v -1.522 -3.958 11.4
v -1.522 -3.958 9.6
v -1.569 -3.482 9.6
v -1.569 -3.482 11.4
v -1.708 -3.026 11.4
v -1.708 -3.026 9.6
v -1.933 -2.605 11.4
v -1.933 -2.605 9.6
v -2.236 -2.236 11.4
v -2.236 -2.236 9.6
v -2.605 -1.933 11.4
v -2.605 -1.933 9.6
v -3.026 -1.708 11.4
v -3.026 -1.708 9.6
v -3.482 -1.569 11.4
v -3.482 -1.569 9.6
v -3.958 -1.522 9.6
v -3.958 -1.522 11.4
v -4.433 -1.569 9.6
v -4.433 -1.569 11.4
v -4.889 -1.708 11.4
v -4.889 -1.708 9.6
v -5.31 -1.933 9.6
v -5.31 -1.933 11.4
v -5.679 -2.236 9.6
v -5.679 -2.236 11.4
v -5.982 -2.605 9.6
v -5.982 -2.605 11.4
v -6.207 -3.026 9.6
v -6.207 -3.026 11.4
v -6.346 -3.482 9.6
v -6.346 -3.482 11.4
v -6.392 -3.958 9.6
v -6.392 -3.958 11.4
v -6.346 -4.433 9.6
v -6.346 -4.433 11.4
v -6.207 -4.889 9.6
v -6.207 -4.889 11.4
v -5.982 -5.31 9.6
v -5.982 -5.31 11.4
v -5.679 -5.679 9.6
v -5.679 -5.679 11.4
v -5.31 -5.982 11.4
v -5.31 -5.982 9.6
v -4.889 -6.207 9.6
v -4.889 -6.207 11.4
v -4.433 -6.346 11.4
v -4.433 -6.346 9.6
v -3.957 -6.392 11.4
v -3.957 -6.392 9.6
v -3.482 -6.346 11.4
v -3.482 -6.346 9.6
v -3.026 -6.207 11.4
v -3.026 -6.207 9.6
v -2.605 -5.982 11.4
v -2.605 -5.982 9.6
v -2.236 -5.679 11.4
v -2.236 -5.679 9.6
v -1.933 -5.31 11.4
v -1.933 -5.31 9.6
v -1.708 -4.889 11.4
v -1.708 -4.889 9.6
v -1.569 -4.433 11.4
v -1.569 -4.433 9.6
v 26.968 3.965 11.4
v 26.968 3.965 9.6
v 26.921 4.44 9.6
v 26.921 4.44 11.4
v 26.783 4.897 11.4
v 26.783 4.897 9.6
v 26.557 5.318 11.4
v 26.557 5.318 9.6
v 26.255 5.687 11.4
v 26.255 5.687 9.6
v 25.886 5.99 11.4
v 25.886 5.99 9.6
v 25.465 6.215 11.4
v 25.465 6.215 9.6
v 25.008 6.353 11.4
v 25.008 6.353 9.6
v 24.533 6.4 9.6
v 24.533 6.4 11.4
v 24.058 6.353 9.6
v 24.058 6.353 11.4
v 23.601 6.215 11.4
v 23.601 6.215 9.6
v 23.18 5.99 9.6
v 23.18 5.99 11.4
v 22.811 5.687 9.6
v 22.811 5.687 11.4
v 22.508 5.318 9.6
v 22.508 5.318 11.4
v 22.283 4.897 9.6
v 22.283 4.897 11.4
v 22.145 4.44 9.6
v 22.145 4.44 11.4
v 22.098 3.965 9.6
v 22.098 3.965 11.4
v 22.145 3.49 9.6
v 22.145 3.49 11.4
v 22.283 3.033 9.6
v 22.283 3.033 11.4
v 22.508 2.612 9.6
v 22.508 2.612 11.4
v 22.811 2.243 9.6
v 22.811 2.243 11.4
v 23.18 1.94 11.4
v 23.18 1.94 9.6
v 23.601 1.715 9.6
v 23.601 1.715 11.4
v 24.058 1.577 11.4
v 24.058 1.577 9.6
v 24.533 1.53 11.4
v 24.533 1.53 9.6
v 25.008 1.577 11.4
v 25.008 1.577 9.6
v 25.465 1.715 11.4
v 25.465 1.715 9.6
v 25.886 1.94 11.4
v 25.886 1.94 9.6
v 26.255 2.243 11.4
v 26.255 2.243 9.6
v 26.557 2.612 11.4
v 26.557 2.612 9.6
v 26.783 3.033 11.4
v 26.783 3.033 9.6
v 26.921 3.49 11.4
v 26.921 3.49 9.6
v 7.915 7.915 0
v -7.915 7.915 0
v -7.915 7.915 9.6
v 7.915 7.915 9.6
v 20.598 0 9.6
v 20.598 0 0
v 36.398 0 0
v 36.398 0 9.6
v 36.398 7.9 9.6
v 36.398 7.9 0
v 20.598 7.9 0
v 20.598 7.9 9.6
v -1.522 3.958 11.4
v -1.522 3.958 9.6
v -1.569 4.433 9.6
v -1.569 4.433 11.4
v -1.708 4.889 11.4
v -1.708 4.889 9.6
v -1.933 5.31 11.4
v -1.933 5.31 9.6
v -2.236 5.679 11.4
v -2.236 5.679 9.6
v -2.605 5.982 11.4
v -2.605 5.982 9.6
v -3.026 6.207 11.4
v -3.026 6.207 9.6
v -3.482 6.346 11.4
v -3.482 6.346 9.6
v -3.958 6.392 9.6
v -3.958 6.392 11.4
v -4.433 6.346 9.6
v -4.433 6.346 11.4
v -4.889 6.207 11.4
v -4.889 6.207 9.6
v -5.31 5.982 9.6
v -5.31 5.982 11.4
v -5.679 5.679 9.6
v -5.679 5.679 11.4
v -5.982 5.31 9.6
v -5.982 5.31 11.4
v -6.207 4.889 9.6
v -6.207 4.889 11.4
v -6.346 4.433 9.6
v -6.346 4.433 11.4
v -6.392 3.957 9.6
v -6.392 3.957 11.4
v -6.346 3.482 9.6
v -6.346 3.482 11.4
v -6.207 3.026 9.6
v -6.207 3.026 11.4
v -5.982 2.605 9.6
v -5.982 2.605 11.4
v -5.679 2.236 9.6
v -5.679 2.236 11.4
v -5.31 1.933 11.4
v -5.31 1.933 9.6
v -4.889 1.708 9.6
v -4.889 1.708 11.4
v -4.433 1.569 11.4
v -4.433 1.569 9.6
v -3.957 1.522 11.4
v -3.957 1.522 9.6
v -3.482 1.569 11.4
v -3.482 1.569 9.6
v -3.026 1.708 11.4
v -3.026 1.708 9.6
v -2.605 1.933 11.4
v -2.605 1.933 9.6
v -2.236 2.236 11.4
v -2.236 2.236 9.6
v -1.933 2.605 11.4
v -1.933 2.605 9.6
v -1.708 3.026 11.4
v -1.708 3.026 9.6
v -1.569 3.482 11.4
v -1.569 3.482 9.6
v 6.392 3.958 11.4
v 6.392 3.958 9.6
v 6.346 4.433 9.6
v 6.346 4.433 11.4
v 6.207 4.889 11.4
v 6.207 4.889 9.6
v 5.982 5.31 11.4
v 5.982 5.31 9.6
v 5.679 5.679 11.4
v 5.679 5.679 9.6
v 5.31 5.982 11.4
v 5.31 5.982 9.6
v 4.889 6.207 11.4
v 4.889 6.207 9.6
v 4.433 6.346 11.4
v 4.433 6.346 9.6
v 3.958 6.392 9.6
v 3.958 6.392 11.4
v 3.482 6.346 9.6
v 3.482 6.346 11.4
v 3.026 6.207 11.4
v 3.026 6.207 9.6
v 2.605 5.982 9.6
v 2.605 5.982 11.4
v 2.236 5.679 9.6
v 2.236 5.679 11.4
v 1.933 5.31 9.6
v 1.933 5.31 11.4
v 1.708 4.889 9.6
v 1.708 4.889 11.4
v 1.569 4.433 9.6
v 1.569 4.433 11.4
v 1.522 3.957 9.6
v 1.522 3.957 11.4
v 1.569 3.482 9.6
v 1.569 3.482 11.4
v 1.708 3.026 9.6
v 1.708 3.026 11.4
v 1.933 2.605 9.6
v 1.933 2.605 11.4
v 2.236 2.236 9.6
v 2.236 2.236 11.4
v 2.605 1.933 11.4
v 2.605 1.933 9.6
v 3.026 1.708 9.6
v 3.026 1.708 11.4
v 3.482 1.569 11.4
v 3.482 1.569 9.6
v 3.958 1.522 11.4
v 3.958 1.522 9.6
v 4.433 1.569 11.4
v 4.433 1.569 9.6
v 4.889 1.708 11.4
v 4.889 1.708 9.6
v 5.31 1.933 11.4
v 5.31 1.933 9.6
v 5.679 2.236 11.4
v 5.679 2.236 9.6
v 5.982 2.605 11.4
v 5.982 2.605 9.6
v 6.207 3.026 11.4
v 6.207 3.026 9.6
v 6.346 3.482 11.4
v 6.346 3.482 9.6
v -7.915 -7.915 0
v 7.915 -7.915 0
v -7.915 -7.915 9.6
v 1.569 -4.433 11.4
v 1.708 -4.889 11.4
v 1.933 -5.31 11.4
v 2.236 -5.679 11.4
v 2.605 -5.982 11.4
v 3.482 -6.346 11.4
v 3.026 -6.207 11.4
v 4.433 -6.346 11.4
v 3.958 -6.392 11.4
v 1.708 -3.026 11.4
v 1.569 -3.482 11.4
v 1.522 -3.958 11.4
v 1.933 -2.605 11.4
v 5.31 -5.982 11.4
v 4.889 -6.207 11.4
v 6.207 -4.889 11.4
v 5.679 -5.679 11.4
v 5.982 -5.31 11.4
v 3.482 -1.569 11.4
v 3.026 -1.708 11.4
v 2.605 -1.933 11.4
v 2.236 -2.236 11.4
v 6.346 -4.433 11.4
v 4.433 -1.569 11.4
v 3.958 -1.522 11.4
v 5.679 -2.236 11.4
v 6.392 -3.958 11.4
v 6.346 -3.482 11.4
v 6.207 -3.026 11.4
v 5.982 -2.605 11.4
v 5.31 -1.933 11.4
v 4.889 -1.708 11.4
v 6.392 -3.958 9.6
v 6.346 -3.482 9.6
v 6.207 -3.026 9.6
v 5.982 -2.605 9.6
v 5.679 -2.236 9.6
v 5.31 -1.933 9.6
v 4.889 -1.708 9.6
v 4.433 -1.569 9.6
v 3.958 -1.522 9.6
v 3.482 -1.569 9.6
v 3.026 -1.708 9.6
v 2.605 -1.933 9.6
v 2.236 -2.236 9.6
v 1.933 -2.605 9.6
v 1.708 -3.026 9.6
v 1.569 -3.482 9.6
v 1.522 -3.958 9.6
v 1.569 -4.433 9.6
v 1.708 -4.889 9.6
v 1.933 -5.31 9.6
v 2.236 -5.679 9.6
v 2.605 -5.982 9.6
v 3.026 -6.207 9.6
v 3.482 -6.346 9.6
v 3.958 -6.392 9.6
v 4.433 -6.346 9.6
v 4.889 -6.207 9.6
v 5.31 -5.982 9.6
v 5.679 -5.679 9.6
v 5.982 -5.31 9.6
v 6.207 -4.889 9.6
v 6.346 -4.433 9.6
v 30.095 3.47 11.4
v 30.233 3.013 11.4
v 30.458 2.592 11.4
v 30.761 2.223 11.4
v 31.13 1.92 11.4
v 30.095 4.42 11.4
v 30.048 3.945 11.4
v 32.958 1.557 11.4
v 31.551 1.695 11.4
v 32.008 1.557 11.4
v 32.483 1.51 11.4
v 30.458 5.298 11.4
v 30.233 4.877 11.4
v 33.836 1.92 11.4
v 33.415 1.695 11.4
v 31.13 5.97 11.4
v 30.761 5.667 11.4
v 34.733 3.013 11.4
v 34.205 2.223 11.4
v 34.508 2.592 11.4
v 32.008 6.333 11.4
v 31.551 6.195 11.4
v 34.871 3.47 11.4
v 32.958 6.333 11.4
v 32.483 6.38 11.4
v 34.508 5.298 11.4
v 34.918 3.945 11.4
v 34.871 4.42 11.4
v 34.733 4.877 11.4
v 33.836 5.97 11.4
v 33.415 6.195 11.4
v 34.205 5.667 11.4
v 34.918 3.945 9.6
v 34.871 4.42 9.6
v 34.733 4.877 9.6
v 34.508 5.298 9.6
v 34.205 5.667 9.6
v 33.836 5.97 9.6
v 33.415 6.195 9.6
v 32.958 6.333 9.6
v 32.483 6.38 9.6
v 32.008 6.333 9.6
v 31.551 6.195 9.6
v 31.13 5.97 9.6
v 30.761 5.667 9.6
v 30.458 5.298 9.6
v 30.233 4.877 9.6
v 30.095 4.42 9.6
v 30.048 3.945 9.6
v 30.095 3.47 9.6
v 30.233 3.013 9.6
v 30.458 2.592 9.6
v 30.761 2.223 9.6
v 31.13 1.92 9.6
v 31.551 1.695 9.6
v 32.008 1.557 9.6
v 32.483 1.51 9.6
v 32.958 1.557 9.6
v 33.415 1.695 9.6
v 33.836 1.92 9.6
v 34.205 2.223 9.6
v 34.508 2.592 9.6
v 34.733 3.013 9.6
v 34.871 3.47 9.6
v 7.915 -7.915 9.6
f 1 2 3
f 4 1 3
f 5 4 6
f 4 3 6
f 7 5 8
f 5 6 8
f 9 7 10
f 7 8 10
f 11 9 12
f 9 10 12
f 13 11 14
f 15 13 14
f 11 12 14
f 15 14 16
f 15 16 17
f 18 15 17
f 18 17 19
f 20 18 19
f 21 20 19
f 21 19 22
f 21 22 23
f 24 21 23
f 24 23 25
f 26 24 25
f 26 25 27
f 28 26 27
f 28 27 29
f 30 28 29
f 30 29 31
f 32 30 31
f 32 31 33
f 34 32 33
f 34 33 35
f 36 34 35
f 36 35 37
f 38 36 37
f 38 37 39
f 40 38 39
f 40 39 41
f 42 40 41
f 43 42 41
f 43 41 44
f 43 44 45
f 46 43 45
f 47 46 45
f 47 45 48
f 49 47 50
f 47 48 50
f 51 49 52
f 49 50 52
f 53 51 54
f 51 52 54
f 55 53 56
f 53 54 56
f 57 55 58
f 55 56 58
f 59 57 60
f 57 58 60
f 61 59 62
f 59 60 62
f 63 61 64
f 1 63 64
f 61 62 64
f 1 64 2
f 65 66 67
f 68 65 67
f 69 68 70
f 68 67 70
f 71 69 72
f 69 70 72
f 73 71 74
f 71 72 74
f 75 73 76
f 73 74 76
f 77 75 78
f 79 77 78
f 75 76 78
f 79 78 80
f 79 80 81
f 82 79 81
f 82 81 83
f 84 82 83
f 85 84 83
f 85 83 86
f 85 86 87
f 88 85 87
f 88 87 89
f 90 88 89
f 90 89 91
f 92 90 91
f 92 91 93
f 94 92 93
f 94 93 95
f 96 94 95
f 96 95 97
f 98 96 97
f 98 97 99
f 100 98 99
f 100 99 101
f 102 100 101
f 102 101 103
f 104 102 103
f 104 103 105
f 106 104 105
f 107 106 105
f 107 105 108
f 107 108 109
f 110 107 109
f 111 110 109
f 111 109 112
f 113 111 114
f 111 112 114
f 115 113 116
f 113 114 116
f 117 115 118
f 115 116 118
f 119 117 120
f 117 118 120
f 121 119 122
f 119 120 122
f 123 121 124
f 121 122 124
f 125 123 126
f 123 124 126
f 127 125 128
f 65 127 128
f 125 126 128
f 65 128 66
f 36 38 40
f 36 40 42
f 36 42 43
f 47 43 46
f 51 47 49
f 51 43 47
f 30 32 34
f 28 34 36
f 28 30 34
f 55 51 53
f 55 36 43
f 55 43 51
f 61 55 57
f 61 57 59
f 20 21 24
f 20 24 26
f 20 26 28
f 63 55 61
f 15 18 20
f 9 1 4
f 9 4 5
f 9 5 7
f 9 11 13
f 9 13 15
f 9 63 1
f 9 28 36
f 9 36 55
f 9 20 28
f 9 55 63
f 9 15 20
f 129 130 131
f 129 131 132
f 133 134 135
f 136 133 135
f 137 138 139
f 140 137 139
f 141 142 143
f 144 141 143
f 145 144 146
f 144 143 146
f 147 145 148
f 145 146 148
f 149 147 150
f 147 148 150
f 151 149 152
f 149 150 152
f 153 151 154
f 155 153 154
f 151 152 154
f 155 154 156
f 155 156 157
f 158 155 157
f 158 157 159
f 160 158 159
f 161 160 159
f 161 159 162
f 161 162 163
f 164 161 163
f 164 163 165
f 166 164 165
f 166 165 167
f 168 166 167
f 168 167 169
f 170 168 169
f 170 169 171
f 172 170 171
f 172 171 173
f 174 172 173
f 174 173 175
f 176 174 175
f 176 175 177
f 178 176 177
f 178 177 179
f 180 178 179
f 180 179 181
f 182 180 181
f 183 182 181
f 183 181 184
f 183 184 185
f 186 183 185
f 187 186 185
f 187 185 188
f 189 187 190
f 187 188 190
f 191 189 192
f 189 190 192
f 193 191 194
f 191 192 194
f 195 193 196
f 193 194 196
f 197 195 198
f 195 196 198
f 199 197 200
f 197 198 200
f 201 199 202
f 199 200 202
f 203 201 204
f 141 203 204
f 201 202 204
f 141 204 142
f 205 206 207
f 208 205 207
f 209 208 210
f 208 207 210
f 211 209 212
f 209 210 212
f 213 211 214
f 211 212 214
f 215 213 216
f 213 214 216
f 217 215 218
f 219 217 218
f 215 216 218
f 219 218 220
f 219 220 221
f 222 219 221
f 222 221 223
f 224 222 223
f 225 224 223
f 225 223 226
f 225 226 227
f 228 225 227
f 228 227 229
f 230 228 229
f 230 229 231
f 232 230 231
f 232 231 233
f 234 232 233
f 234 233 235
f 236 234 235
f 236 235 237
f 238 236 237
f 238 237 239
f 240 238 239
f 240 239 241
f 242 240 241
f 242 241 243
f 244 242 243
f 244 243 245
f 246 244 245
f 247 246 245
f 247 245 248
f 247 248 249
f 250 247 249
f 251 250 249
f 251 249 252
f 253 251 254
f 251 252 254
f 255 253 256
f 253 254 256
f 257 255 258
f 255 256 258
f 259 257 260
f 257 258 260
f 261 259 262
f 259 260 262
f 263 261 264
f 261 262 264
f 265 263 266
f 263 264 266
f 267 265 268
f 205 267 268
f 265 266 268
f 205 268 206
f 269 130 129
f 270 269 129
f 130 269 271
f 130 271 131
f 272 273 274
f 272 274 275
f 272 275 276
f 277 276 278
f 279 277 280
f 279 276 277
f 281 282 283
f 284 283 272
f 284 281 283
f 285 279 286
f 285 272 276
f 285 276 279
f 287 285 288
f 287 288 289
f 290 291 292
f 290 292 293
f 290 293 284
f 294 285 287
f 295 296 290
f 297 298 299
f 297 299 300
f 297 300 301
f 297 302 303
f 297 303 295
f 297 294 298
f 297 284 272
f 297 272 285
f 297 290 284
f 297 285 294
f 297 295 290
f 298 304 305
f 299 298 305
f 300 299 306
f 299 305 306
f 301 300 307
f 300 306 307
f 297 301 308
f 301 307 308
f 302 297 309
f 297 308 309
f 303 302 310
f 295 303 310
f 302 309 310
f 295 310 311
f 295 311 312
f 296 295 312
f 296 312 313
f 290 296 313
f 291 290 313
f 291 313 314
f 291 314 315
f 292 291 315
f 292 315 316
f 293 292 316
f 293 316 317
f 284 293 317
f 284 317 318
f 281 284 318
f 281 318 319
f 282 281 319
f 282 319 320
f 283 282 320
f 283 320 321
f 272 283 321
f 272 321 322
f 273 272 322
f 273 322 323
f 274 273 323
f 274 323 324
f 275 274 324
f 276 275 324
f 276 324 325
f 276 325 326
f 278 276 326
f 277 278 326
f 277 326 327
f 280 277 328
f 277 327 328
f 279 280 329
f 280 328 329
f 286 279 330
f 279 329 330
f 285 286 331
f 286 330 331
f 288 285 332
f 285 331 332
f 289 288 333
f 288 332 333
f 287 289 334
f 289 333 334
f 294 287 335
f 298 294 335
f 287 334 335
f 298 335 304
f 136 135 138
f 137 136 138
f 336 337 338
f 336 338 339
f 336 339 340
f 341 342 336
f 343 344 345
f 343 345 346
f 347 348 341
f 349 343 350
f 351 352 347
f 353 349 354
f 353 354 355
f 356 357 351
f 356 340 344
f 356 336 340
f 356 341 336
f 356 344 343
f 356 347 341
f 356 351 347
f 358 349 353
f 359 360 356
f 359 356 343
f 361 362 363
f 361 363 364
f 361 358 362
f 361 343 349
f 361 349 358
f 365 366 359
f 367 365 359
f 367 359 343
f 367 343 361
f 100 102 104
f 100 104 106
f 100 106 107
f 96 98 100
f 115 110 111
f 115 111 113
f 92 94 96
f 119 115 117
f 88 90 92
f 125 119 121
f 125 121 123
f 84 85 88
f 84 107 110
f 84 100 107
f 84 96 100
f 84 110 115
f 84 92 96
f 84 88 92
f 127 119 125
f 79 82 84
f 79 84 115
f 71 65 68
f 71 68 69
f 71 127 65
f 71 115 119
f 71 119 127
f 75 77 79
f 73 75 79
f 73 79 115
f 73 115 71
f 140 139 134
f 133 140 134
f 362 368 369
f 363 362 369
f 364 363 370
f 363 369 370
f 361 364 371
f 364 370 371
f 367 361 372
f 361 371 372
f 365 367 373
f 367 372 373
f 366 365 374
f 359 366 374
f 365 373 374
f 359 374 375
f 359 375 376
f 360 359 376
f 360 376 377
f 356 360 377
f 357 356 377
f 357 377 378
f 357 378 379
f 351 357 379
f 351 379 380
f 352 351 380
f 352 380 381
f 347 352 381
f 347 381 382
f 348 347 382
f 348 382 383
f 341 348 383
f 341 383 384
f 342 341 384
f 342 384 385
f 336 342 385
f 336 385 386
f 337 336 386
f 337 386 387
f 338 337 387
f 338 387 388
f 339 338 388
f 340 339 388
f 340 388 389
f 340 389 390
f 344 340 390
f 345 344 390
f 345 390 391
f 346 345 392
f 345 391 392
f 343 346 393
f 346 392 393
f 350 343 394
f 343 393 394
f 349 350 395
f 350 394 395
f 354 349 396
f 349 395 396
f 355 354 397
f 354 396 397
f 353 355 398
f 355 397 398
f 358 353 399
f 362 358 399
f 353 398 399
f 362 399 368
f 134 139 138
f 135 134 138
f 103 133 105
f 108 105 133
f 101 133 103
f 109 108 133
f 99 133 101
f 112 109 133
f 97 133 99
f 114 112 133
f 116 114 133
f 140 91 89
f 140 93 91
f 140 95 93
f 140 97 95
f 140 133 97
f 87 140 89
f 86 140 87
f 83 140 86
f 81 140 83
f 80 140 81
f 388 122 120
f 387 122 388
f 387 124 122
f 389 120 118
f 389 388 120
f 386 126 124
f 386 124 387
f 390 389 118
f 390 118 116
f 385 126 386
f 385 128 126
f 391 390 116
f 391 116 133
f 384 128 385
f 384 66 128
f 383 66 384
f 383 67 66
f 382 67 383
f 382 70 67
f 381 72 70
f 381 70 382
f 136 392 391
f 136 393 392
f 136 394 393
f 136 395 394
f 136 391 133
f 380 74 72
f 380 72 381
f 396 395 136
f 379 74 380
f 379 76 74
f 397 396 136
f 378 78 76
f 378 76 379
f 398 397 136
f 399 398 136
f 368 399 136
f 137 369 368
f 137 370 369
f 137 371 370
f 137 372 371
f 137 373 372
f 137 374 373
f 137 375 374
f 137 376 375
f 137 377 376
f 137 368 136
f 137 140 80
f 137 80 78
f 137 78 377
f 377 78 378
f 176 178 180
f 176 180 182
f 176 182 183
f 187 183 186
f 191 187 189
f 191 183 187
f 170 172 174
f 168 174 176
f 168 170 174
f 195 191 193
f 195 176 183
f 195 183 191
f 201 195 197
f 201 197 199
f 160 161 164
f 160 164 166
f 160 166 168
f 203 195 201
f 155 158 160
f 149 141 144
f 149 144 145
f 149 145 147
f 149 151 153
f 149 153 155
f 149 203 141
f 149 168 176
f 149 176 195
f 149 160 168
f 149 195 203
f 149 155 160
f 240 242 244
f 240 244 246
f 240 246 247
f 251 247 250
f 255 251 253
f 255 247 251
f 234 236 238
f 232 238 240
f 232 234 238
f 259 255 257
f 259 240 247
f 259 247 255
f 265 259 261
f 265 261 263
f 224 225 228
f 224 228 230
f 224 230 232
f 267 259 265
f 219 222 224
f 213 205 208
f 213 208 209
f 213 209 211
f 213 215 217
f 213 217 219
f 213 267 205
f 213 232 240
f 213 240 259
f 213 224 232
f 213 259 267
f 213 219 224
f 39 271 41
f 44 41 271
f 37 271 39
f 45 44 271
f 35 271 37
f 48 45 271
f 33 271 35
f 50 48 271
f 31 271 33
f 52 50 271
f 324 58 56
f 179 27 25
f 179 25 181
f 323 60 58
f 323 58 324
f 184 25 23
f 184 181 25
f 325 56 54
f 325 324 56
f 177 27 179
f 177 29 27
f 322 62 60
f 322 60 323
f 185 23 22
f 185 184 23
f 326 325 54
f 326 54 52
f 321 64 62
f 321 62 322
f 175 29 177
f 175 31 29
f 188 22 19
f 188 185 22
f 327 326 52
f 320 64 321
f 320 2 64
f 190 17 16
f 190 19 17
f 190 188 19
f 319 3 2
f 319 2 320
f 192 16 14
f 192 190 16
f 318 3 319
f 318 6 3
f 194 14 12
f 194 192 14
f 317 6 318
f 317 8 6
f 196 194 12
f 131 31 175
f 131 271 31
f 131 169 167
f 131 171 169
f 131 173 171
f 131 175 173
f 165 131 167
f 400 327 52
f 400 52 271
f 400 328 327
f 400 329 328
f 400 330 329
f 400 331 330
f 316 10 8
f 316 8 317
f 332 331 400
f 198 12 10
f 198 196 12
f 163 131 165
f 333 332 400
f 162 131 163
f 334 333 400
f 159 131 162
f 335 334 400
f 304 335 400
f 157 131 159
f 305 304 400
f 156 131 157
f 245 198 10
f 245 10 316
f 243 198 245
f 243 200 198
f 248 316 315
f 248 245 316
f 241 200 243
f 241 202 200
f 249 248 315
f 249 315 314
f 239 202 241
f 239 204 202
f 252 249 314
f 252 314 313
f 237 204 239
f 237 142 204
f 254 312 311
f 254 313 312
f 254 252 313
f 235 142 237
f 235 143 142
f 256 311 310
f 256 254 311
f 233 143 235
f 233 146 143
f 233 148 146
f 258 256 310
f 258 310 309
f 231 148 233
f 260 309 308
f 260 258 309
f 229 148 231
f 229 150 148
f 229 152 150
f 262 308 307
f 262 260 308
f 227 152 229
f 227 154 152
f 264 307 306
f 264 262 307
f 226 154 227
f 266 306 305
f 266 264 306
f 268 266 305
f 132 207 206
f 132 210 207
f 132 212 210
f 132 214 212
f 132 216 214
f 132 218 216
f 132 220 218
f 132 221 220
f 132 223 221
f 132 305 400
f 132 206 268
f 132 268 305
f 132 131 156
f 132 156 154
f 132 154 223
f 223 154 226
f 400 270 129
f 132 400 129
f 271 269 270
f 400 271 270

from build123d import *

# Parameters (mm, degrees)
F0_W     = 15.83
F0_H     = 15.83
F0_R     = 2.435
F1_DEPTH = 9.6
F2_DEPTH = 11.4


with BuildPart() as f1:
    # F0 (on Top) → F1 (new body)
    with BuildSketch(Plane.XY):
        Rectangle(F0_W, F0_H)
        with Locations((-3.9575, -3.9575)):
            Circle(F0_R, mode=Mode.SUBTRACT)
        with Locations((3.9575, -3.9575)):
            Circle(F0_R, mode=Mode.SUBTRACT)
        with Locations((-3.9575, 3.9575)):
            Circle(F0_R, mode=Mode.SUBTRACT)
        with Locations((3.9575, 3.9575)):
            Circle(F0_R, mode=Mode.SUBTRACT)
        Polygon((22.097854, 7.9), (20.597854, 7.9), (20.597854, 6.4), (20.597854, 0), (36.397854, 0), (36.397854, 7.9), (30.067854, 7.9), (28.517854, 7.9), (26.967854, 7.9), align=None)
        with Locations((32.482879, 3.944873)):
            Circle(F0_R, mode=Mode.SUBTRACT)
        with Locations((24.532854, 3.965)):
            Circle(F0_R, mode=Mode.SUBTRACT)
    extrude(amount=F1_DEPTH)

    # F0 (on Top) → F2 (join)
    with BuildSketch(Plane.XY):
        with Locations((-3.9575, 3.9575)):
            Circle(F0_R)
        with Locations((3.9575, 3.9575)):
            Circle(F0_R)
        with Locations((3.9575, -3.9575)):
            Circle(F0_R)
        with Locations((24.532854, 3.965)):
            Circle(F0_R)
        with Locations((32.482879, 3.944873)):
            Circle(F0_R)
        with Locations((-3.9575, -3.9575)):
            Circle(F0_R)
    extrude(amount=F2_DEPTH)


solid = f1.part
